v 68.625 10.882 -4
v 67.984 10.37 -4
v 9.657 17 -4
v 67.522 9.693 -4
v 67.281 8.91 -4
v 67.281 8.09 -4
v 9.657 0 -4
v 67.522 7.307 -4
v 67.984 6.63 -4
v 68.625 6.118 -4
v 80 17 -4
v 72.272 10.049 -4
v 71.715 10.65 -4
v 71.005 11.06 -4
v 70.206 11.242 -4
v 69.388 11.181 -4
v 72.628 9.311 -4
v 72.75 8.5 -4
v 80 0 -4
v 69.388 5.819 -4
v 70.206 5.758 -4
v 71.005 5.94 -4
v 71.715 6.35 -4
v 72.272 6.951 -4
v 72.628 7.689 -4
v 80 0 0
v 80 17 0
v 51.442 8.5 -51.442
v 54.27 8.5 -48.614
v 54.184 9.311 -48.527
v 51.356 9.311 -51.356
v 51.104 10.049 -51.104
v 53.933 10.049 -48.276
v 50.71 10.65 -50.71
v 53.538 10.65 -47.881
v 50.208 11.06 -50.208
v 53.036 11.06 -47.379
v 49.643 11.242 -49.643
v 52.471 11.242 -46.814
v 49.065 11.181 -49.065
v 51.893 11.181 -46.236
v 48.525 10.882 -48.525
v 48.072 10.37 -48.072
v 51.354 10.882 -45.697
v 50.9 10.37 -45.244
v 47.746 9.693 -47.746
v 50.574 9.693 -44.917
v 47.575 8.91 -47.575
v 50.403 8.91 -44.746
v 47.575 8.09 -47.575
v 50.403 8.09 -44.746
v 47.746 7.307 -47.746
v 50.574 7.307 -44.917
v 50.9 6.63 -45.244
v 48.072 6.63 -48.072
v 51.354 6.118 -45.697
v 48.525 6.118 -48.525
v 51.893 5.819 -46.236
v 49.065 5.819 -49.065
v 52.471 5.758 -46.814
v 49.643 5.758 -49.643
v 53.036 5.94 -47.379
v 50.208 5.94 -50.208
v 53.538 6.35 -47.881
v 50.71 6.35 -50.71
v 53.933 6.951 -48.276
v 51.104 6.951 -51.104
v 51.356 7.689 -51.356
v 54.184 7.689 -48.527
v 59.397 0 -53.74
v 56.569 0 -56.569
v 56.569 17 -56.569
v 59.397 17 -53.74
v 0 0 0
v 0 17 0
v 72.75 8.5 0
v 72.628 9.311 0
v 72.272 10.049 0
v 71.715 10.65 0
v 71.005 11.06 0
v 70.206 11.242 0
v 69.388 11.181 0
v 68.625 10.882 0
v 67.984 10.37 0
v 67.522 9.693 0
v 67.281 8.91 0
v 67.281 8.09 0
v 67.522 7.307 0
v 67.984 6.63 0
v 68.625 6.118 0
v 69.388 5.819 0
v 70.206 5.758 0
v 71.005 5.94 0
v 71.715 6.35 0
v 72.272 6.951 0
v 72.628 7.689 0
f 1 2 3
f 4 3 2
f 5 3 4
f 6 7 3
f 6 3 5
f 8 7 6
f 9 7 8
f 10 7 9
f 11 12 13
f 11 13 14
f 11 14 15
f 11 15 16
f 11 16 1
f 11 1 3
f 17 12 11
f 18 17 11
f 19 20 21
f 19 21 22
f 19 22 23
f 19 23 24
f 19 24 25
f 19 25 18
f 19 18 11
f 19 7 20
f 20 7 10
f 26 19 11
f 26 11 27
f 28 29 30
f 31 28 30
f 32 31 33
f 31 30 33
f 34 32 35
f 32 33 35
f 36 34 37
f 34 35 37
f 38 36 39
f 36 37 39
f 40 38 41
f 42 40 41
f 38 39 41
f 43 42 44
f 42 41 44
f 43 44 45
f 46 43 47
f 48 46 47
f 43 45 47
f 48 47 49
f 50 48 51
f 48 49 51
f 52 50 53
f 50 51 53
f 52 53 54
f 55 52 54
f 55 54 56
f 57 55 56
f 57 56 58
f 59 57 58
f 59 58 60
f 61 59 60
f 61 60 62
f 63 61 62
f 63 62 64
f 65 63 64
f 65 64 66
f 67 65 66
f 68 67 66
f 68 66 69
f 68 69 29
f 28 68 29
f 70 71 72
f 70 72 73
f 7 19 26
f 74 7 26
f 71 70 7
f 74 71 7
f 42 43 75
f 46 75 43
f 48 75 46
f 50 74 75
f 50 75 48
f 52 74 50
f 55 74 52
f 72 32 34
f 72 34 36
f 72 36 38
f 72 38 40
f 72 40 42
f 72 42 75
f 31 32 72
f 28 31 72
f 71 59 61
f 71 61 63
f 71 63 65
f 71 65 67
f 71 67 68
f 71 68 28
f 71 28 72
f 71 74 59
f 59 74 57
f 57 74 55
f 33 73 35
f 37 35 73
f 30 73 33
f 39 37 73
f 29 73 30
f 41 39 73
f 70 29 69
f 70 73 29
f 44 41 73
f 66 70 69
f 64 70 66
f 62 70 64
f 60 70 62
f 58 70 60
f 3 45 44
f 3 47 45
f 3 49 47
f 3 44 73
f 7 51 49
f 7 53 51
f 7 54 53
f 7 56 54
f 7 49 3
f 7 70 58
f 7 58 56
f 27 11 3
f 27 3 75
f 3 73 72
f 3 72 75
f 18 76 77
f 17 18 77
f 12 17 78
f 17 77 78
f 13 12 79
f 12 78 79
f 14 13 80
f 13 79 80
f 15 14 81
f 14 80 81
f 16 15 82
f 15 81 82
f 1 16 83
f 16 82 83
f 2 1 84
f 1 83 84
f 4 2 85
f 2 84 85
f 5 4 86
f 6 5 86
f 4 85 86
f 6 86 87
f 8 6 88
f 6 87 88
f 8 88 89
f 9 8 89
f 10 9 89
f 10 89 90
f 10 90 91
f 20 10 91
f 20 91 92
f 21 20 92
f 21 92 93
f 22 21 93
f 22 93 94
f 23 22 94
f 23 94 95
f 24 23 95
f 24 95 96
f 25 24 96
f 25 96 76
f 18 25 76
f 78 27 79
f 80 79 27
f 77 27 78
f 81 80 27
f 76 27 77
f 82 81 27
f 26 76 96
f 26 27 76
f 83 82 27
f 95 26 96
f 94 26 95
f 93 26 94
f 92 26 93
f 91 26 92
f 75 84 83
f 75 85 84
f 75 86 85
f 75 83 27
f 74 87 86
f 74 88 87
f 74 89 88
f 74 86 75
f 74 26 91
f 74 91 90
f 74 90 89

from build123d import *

# Parameters (mm, degrees)
EXTRUDE_1_DEPTH     = 17
SKETCH_2_R          = 2.75
CUT_EXTRUDE_1_DEPTH = 17
SKETCH_3_R          = 2.75
CUT_EXTRUDE_2_DEPTH = 17


with BuildPart() as part:
    # 草图1 → 凸台-拉伸1 (new body)
    with BuildSketch(Plane(origin=(0, 0, 0), x_dir=(1, 0, 0), z_dir=(0, 1, 0))):
        Polygon((80, 0), (0, 0), (56.568542495, 56.568542495), (59.39696962, 53.74011537), (9.656854249, 4), (80, 4), align=None)
    extrude(amount=EXTRUDE_1_DEPTH)

    # 草图2 → 切除-拉伸1 (cut)
    with BuildSketch(Plane(origin=(2.828427125, 0, 2.828427125), x_dir=(0.7071067811865476, 0, -0.7071067811865476), z_dir=(0.7071067811865476, 0, 0.7071067811865476))):
        with Locations((70, 8.5)):
            Circle(SKETCH_2_R)
    extrude(amount=-CUT_EXTRUDE_1_DEPTH, mode=Mode.SUBTRACT)

    # 草图3 → 切除-拉伸2 (cut)
    with BuildSketch(Plane.XY):
        with Locations((70, 8.5)):
            Circle(SKETCH_3_R)
    extrude(amount=-CUT_EXTRUDE_2_DEPTH, mode=Mode.SUBTRACT)


solid = part.part
